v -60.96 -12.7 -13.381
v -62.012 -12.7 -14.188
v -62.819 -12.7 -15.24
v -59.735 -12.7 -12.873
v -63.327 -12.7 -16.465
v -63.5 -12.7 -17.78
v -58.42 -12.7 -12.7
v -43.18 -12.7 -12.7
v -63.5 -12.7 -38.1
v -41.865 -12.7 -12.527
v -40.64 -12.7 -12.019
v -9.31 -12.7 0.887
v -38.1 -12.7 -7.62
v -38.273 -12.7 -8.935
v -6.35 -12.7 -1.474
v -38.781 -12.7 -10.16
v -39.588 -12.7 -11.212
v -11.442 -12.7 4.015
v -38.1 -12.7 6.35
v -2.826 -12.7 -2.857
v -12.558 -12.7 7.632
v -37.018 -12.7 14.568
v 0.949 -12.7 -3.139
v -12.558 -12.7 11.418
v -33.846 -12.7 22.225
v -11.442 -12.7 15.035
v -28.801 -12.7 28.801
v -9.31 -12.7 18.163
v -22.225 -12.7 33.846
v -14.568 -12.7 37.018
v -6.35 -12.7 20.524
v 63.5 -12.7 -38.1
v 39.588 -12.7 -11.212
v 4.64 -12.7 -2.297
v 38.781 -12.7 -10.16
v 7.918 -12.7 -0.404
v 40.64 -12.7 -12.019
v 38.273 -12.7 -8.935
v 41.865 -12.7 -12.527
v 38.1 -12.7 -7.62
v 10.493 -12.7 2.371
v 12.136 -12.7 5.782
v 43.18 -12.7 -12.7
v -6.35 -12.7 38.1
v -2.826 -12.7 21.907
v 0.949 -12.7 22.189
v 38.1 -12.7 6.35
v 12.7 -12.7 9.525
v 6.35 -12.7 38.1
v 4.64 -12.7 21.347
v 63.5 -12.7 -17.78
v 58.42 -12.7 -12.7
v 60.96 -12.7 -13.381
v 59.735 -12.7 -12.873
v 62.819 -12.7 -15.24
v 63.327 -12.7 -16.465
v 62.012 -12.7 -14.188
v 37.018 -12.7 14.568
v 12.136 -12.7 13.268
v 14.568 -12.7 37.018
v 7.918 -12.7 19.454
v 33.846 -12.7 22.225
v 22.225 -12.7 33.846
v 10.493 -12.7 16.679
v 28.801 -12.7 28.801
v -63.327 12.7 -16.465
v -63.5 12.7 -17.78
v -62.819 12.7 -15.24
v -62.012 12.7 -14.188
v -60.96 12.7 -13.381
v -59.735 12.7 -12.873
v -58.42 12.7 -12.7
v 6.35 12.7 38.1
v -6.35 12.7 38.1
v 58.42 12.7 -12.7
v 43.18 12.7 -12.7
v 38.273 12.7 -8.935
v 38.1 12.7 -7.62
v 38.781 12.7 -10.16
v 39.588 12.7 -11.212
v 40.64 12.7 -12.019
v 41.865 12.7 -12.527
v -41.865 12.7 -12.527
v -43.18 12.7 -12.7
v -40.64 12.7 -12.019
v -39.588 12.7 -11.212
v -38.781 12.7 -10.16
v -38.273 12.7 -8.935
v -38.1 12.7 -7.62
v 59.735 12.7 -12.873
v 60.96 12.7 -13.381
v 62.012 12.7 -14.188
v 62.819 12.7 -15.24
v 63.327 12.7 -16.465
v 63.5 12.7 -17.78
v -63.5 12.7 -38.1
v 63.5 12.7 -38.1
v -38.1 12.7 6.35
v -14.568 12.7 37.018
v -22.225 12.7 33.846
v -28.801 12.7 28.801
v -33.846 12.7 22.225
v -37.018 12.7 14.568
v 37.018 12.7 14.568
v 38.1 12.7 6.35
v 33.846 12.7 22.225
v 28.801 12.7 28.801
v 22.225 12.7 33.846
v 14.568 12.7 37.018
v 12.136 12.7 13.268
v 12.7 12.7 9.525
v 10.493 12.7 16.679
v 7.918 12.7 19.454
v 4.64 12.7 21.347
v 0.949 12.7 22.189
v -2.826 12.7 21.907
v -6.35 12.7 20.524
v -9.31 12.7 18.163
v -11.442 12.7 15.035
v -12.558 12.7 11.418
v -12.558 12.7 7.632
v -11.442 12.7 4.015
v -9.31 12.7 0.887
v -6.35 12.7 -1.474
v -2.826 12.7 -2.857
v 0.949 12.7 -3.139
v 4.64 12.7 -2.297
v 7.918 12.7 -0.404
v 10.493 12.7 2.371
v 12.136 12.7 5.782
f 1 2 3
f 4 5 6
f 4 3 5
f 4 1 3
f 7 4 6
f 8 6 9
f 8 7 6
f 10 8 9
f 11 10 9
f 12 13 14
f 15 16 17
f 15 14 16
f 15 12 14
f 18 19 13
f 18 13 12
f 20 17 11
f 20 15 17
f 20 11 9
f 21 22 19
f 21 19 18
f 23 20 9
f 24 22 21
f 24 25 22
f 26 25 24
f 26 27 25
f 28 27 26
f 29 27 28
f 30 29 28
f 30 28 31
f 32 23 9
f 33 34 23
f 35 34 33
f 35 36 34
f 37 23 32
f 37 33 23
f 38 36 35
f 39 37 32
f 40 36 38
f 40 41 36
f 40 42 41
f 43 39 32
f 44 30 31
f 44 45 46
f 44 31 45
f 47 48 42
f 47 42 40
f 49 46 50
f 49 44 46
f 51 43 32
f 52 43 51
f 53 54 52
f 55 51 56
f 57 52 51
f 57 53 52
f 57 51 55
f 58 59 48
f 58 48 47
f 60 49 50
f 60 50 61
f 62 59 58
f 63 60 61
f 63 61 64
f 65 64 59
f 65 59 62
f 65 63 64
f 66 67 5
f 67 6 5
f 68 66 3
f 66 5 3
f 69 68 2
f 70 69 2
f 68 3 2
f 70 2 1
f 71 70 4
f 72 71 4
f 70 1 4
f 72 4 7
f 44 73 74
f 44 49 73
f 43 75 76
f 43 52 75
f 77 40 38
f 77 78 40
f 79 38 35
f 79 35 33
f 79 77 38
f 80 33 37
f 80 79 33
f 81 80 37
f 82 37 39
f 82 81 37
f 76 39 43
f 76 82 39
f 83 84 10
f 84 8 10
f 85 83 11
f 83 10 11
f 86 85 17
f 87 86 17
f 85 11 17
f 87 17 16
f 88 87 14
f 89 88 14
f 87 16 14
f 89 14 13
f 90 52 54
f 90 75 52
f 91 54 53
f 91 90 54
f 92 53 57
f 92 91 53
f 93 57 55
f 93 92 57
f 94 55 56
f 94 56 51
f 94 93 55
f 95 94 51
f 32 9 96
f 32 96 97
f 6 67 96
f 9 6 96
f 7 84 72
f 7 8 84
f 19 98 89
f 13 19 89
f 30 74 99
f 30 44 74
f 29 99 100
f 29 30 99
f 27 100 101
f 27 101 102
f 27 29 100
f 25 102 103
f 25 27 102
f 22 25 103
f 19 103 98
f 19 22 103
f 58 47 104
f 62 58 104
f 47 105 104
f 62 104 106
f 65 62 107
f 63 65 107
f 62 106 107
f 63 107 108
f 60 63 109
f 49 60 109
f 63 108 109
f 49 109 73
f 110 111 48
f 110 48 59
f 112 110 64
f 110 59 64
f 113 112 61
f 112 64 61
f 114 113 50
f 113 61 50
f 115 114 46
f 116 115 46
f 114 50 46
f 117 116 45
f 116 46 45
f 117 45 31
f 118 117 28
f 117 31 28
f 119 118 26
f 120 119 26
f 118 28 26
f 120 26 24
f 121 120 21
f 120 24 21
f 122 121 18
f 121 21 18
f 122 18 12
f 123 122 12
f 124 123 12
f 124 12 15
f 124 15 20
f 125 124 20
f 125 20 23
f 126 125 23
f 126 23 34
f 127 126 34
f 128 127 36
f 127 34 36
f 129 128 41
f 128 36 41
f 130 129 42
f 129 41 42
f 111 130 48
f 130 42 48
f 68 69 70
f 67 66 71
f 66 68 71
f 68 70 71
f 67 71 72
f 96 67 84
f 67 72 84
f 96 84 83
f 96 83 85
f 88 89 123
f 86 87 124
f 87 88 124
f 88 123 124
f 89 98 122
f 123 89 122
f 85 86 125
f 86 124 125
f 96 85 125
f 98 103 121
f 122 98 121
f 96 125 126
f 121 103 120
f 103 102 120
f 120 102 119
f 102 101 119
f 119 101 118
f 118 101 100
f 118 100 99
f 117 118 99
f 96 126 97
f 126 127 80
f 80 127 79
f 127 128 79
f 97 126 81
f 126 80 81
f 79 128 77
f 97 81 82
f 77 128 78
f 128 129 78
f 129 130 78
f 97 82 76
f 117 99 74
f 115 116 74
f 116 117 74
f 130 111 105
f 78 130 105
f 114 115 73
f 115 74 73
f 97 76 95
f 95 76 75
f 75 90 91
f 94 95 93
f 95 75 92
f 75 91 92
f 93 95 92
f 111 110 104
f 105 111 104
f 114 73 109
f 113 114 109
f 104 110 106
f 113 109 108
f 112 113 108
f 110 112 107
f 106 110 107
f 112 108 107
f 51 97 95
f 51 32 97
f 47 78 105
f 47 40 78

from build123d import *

# Parameters (mm, degrees)
F1_DEPTH = 12.7
F2_R     = 5.08
F3_R     = 31.75
F4_R     = 12.7
F5_DEPTH = 25.4


with BuildPart() as f1:
    # F0 (on Front) → F1 (new body, symmetric)
    with BuildSketch(Plane.XZ):
        Polygon((38.1, 38.1), (-38.1, 38.1), (-38.1, -12.7), (0, -12.7), (38.1, -12.7), align=None)
        Polygon((-38.1, -12.7), (-63.5, -12.7), (-63.5, -38.1), (63.5, -38.1), (63.5, -12.7), (38.1, -12.7), (0, -12.7), align=None)
    extrude(amount=F1_DEPTH, both=True)

    # F2
    f2_edges = [f1.edges().sort_by_distance(p)[0] for p in [
        (-63.5, 0, -12.7),
        (63.5, 0, -12.7),
        (-38.1, 0, -12.7),
        (38.1, 0, -12.7),
    ]]
    fillet(f2_edges, radius=F2_R)

    # F3
    f3_edges = [f1.edges().sort_by_distance(p)[0] for p in [
        (-38.1, 0, 38.1),
        (38.1, 0, 38.1),
    ]]
    fillet(f3_edges, radius=F3_R)

    # F4 (on Front) → F5 (cut, symmetric)
    with BuildSketch(Plane.XZ):
        with Locations((0, 9.525)):
            Circle(F4_R)
    extrude(amount=F5_DEPTH, both=True, mode=Mode.SUBTRACT)


solid = f1.part
